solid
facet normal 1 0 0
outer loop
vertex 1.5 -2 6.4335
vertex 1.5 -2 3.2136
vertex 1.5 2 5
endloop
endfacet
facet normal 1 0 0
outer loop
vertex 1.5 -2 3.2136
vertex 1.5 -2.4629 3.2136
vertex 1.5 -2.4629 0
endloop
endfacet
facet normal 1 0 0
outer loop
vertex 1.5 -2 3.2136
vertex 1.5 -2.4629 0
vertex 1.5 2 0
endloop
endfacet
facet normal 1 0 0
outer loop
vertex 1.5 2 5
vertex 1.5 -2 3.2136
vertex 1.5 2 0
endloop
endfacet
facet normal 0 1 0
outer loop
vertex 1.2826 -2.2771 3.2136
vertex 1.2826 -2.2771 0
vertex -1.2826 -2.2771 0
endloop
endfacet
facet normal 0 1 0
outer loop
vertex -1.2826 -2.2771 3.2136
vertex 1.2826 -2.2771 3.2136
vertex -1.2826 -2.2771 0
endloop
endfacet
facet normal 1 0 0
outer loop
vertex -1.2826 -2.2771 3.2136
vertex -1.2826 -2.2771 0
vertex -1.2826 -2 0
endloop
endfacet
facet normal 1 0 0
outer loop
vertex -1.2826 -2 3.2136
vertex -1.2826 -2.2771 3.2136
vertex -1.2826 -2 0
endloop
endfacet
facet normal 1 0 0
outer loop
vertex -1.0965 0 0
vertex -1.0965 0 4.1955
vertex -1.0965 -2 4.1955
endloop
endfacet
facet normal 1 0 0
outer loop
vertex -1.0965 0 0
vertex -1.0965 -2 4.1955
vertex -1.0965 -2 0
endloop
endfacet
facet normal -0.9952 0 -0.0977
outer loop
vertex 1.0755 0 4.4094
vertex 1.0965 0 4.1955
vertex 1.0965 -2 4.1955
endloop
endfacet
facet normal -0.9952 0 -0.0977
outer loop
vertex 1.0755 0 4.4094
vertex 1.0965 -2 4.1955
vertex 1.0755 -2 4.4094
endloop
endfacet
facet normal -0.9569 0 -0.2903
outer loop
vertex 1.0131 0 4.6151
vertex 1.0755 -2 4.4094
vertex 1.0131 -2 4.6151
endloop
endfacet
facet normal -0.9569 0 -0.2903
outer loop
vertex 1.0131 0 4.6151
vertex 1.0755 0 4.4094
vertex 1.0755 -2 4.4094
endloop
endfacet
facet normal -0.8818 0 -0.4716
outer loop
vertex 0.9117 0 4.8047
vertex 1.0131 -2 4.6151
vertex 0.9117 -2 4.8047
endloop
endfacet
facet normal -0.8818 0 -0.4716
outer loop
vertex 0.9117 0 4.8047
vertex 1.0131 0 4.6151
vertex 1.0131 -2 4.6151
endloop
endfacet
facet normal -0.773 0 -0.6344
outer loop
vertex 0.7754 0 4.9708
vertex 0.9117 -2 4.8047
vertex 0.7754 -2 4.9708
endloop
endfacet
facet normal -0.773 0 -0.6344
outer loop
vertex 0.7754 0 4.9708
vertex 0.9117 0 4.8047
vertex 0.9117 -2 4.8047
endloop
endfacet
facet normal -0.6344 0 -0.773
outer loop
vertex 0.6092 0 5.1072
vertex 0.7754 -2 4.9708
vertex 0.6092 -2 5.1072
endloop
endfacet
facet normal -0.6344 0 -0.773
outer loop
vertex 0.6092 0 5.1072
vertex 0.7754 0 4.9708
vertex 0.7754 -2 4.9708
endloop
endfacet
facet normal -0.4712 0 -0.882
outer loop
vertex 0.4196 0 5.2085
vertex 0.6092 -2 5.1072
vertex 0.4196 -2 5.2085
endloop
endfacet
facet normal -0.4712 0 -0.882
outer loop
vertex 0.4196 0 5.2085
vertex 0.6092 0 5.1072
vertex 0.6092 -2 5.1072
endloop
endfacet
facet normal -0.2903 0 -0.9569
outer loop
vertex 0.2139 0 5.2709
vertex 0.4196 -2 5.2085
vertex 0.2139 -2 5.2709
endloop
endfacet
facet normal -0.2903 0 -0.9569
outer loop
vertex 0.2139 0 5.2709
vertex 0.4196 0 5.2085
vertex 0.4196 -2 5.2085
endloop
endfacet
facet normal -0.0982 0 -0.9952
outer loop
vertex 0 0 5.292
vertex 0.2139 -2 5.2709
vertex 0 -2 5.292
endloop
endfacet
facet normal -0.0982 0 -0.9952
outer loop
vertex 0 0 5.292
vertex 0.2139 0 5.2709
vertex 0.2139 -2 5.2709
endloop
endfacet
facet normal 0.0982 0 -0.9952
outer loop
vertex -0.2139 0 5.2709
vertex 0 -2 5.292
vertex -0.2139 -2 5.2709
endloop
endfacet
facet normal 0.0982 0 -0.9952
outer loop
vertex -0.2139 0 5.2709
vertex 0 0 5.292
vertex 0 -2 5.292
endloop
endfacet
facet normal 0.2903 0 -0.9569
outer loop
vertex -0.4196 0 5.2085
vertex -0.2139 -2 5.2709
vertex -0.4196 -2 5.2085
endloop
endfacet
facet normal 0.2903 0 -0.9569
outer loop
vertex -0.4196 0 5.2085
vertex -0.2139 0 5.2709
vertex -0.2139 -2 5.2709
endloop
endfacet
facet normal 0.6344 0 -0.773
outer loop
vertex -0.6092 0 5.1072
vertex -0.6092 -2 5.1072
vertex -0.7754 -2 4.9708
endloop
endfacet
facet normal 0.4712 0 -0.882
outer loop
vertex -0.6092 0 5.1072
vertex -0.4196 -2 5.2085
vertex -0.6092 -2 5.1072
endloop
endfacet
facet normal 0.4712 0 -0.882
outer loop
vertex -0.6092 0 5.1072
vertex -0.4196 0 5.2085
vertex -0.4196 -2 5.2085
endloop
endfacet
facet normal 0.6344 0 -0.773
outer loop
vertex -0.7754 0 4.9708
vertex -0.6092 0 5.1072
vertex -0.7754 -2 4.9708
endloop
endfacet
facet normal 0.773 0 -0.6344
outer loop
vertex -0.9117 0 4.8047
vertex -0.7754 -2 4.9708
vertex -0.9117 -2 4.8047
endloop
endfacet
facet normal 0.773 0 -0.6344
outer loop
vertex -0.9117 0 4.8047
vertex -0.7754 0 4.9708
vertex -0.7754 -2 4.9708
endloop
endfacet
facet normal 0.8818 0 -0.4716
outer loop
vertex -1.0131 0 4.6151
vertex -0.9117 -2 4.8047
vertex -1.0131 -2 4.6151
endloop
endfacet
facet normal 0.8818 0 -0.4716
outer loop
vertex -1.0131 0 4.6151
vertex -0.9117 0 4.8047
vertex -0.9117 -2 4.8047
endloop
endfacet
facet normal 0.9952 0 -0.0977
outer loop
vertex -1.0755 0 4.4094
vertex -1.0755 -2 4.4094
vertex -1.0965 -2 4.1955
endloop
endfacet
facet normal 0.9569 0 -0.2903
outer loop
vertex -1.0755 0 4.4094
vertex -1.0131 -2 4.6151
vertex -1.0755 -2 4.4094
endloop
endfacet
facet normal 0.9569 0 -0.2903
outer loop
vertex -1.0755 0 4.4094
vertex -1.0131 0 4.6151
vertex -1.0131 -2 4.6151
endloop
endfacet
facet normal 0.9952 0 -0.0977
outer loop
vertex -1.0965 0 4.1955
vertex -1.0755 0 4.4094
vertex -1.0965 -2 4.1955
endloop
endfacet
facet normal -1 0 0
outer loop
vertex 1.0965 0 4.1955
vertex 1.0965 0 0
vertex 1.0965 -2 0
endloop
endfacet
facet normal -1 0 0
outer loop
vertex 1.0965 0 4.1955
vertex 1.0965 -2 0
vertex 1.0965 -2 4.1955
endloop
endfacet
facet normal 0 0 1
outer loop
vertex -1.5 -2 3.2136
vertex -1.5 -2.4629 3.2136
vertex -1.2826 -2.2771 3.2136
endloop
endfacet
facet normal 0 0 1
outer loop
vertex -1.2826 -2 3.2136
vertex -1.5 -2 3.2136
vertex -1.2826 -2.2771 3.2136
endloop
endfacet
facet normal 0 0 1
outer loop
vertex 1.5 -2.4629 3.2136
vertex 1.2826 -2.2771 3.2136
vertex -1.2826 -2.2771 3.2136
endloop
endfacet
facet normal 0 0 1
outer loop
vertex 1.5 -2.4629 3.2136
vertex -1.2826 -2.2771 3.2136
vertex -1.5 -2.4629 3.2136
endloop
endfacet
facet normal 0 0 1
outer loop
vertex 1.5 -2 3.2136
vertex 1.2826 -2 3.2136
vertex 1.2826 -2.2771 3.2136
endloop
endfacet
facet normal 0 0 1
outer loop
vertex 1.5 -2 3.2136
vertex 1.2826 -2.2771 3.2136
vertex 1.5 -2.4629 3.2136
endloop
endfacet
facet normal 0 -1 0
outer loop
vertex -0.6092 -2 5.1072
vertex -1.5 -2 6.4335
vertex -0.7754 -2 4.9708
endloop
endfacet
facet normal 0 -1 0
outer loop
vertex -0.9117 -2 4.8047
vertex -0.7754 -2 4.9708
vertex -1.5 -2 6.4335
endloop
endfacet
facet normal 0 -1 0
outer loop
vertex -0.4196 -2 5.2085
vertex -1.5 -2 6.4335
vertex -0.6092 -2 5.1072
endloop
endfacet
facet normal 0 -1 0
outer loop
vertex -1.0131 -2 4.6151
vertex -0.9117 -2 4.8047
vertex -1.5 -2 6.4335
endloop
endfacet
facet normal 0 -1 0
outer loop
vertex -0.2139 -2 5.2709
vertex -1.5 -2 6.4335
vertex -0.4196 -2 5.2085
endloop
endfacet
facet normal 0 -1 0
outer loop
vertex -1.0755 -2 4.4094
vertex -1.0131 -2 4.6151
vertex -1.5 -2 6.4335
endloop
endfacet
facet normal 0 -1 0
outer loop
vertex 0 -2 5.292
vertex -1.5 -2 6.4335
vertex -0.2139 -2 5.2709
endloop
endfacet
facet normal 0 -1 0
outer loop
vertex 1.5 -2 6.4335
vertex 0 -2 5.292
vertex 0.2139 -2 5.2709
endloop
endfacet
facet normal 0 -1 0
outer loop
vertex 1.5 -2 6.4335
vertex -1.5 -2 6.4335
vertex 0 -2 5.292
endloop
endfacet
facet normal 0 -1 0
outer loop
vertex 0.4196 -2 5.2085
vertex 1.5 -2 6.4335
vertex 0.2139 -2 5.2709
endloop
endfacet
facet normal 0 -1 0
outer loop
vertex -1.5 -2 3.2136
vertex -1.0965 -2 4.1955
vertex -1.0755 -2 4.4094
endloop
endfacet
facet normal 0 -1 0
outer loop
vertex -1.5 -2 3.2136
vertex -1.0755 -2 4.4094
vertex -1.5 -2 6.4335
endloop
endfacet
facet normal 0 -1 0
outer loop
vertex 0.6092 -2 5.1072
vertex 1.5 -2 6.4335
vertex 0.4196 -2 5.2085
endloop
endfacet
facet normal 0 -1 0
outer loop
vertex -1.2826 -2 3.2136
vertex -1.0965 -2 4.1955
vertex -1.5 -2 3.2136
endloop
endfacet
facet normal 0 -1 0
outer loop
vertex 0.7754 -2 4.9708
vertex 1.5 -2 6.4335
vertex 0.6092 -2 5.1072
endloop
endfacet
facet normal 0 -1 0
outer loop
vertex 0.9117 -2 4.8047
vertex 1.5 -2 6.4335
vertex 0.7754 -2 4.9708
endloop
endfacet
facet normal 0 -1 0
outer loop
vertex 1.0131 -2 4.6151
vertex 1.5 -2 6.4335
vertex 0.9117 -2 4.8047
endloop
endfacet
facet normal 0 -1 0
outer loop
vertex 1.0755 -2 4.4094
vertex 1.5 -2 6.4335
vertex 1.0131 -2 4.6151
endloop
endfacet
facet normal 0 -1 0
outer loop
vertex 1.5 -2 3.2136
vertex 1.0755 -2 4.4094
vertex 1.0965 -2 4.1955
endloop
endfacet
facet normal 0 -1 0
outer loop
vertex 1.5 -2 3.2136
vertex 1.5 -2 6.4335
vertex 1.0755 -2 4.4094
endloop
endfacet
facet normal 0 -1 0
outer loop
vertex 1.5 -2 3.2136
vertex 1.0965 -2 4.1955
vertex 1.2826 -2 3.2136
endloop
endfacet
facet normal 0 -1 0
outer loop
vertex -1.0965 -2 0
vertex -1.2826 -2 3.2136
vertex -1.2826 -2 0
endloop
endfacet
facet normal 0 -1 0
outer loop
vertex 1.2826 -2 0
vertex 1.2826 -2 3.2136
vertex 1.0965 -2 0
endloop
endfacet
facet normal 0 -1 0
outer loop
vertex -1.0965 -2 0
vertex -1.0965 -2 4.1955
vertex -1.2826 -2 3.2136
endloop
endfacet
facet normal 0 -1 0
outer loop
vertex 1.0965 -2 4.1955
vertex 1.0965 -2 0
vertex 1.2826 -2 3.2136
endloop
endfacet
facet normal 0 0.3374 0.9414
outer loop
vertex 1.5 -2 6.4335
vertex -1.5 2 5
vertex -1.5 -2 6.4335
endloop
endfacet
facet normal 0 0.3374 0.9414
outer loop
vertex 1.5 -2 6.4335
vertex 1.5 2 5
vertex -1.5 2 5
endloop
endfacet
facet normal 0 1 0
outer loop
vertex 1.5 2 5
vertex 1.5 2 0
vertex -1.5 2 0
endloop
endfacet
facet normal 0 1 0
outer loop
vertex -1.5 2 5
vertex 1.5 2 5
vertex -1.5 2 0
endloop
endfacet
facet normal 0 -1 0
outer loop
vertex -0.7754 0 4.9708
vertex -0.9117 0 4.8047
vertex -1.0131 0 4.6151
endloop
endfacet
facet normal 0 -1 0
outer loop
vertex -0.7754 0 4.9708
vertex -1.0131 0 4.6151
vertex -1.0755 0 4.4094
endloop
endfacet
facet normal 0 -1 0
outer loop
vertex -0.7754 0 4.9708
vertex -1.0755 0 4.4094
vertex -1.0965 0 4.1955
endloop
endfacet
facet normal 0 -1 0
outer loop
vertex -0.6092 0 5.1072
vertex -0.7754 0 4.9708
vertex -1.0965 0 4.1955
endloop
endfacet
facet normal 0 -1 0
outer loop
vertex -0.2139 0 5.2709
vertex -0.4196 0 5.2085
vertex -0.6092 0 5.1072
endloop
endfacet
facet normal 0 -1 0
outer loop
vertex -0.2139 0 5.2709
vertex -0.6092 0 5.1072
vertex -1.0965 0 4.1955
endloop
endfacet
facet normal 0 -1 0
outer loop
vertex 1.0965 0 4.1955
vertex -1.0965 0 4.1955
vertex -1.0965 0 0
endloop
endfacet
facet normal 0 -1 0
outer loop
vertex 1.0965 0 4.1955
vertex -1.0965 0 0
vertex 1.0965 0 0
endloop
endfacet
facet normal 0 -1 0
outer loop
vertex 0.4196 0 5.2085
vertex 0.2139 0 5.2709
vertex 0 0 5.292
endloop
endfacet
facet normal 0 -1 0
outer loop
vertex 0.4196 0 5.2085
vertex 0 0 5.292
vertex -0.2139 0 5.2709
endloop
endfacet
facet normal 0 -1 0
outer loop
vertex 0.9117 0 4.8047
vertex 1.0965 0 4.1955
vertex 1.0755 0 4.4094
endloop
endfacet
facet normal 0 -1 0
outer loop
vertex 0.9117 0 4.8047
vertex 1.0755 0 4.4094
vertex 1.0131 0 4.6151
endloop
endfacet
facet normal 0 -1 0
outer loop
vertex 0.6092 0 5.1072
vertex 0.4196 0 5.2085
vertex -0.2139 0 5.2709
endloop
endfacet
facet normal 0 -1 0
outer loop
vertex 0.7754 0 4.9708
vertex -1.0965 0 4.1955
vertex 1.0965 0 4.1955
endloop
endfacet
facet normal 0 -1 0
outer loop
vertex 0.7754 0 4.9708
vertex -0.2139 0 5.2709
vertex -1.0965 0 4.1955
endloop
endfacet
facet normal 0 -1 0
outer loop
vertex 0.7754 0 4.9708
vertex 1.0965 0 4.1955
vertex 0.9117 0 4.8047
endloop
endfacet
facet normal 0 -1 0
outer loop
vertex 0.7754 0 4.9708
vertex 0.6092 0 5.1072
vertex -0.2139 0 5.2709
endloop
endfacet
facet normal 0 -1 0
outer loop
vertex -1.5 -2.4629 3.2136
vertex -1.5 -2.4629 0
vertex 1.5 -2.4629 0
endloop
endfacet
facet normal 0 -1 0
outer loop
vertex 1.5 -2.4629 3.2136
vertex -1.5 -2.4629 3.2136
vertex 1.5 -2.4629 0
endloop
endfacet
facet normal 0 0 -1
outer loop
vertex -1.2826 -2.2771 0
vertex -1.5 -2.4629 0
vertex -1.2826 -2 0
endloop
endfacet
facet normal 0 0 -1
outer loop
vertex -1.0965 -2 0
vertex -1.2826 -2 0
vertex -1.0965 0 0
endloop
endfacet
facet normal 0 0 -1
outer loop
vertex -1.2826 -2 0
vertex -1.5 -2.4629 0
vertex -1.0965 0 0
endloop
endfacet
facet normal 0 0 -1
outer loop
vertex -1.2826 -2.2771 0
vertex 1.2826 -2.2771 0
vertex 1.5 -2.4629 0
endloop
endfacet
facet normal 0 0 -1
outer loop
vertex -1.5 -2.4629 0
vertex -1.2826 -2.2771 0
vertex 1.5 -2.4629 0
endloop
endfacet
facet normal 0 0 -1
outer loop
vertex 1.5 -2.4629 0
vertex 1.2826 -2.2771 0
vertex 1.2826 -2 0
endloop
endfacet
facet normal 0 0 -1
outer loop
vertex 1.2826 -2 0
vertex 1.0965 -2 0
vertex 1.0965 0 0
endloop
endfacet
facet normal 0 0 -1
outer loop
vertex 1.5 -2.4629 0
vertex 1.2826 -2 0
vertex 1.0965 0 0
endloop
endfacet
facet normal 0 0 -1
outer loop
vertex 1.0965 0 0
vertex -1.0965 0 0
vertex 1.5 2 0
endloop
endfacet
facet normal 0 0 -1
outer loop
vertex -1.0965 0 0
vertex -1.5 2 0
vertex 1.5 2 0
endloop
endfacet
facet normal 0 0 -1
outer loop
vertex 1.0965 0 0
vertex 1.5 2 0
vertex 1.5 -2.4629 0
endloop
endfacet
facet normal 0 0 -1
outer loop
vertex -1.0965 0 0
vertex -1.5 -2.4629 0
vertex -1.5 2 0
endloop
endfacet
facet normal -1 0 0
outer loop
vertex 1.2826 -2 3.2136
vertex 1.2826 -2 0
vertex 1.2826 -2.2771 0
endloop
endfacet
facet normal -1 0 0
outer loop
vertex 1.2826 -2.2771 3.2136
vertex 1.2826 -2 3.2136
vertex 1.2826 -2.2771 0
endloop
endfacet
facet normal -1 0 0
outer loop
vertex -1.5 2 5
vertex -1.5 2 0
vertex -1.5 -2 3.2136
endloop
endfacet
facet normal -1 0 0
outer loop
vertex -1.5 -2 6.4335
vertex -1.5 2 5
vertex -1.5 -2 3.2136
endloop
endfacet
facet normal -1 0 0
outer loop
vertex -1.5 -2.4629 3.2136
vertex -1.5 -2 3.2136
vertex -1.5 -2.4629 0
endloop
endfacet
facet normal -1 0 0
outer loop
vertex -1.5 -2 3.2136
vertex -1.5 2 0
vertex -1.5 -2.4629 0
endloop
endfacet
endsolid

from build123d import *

# Parameters (mm, degrees)
F1_DEPTH      = 5
F3_DEPTH      = 1.5
F3_DEPTH_BACK = 1.5
F5_DEPTH      = 6.23198
F6_DEPTH      = 3.21356


with BuildPart() as f1:
    # F0 (on Top) → F1 (new body)
    with BuildSketch(Plane.XY):
        Polygon((1.5, 2), (-1.5, 2), (-1.5, -2), (-1.282606, -2), (1.282606, -2), (1.5, -2), align=None)
    extrude(amount=F1_DEPTH)

    # F2 (on Right) → F3 (join, two sides)
    with BuildSketch(Plane.YZ) as f3_sk:
        Polygon((-2, 5), (2, 5), (-2, 6.433511), align=None)
    extrude(amount=F3_DEPTH)
    extrude(f3_sk.sketch, amount=-F3_DEPTH_BACK)

    # F4 (on Front) → F5 (cut)
    with BuildSketch(Plane.XZ):
        with BuildLine():
            Line((1.096531, 0), (1.096531, 4.195458))
            ThreePointArc((1.096531, 4.195458), (0, 5.29199), (-1.096531, 4.195458))
            Line((-1.096531, 4.195458), (-1.096531, 0))
            Line((-1.096531, 0), (1.096531, 0))
        make_face()
    extrude(amount=F5_DEPTH, mode=Mode.SUBTRACT)

    # F0 (on Top) → F6 (join)
    with BuildSketch(Plane.XY):
        Polygon((-1.282606, -2), (-1.5, -2), (-1.5, -2.462873), (1.5, -2.462873), (1.5, -2), (1.282606, -2), (1.282606, -2.277132), (-1.282606, -2.277132), align=None)
    extrude(amount=F6_DEPTH)


solid = f1.part
